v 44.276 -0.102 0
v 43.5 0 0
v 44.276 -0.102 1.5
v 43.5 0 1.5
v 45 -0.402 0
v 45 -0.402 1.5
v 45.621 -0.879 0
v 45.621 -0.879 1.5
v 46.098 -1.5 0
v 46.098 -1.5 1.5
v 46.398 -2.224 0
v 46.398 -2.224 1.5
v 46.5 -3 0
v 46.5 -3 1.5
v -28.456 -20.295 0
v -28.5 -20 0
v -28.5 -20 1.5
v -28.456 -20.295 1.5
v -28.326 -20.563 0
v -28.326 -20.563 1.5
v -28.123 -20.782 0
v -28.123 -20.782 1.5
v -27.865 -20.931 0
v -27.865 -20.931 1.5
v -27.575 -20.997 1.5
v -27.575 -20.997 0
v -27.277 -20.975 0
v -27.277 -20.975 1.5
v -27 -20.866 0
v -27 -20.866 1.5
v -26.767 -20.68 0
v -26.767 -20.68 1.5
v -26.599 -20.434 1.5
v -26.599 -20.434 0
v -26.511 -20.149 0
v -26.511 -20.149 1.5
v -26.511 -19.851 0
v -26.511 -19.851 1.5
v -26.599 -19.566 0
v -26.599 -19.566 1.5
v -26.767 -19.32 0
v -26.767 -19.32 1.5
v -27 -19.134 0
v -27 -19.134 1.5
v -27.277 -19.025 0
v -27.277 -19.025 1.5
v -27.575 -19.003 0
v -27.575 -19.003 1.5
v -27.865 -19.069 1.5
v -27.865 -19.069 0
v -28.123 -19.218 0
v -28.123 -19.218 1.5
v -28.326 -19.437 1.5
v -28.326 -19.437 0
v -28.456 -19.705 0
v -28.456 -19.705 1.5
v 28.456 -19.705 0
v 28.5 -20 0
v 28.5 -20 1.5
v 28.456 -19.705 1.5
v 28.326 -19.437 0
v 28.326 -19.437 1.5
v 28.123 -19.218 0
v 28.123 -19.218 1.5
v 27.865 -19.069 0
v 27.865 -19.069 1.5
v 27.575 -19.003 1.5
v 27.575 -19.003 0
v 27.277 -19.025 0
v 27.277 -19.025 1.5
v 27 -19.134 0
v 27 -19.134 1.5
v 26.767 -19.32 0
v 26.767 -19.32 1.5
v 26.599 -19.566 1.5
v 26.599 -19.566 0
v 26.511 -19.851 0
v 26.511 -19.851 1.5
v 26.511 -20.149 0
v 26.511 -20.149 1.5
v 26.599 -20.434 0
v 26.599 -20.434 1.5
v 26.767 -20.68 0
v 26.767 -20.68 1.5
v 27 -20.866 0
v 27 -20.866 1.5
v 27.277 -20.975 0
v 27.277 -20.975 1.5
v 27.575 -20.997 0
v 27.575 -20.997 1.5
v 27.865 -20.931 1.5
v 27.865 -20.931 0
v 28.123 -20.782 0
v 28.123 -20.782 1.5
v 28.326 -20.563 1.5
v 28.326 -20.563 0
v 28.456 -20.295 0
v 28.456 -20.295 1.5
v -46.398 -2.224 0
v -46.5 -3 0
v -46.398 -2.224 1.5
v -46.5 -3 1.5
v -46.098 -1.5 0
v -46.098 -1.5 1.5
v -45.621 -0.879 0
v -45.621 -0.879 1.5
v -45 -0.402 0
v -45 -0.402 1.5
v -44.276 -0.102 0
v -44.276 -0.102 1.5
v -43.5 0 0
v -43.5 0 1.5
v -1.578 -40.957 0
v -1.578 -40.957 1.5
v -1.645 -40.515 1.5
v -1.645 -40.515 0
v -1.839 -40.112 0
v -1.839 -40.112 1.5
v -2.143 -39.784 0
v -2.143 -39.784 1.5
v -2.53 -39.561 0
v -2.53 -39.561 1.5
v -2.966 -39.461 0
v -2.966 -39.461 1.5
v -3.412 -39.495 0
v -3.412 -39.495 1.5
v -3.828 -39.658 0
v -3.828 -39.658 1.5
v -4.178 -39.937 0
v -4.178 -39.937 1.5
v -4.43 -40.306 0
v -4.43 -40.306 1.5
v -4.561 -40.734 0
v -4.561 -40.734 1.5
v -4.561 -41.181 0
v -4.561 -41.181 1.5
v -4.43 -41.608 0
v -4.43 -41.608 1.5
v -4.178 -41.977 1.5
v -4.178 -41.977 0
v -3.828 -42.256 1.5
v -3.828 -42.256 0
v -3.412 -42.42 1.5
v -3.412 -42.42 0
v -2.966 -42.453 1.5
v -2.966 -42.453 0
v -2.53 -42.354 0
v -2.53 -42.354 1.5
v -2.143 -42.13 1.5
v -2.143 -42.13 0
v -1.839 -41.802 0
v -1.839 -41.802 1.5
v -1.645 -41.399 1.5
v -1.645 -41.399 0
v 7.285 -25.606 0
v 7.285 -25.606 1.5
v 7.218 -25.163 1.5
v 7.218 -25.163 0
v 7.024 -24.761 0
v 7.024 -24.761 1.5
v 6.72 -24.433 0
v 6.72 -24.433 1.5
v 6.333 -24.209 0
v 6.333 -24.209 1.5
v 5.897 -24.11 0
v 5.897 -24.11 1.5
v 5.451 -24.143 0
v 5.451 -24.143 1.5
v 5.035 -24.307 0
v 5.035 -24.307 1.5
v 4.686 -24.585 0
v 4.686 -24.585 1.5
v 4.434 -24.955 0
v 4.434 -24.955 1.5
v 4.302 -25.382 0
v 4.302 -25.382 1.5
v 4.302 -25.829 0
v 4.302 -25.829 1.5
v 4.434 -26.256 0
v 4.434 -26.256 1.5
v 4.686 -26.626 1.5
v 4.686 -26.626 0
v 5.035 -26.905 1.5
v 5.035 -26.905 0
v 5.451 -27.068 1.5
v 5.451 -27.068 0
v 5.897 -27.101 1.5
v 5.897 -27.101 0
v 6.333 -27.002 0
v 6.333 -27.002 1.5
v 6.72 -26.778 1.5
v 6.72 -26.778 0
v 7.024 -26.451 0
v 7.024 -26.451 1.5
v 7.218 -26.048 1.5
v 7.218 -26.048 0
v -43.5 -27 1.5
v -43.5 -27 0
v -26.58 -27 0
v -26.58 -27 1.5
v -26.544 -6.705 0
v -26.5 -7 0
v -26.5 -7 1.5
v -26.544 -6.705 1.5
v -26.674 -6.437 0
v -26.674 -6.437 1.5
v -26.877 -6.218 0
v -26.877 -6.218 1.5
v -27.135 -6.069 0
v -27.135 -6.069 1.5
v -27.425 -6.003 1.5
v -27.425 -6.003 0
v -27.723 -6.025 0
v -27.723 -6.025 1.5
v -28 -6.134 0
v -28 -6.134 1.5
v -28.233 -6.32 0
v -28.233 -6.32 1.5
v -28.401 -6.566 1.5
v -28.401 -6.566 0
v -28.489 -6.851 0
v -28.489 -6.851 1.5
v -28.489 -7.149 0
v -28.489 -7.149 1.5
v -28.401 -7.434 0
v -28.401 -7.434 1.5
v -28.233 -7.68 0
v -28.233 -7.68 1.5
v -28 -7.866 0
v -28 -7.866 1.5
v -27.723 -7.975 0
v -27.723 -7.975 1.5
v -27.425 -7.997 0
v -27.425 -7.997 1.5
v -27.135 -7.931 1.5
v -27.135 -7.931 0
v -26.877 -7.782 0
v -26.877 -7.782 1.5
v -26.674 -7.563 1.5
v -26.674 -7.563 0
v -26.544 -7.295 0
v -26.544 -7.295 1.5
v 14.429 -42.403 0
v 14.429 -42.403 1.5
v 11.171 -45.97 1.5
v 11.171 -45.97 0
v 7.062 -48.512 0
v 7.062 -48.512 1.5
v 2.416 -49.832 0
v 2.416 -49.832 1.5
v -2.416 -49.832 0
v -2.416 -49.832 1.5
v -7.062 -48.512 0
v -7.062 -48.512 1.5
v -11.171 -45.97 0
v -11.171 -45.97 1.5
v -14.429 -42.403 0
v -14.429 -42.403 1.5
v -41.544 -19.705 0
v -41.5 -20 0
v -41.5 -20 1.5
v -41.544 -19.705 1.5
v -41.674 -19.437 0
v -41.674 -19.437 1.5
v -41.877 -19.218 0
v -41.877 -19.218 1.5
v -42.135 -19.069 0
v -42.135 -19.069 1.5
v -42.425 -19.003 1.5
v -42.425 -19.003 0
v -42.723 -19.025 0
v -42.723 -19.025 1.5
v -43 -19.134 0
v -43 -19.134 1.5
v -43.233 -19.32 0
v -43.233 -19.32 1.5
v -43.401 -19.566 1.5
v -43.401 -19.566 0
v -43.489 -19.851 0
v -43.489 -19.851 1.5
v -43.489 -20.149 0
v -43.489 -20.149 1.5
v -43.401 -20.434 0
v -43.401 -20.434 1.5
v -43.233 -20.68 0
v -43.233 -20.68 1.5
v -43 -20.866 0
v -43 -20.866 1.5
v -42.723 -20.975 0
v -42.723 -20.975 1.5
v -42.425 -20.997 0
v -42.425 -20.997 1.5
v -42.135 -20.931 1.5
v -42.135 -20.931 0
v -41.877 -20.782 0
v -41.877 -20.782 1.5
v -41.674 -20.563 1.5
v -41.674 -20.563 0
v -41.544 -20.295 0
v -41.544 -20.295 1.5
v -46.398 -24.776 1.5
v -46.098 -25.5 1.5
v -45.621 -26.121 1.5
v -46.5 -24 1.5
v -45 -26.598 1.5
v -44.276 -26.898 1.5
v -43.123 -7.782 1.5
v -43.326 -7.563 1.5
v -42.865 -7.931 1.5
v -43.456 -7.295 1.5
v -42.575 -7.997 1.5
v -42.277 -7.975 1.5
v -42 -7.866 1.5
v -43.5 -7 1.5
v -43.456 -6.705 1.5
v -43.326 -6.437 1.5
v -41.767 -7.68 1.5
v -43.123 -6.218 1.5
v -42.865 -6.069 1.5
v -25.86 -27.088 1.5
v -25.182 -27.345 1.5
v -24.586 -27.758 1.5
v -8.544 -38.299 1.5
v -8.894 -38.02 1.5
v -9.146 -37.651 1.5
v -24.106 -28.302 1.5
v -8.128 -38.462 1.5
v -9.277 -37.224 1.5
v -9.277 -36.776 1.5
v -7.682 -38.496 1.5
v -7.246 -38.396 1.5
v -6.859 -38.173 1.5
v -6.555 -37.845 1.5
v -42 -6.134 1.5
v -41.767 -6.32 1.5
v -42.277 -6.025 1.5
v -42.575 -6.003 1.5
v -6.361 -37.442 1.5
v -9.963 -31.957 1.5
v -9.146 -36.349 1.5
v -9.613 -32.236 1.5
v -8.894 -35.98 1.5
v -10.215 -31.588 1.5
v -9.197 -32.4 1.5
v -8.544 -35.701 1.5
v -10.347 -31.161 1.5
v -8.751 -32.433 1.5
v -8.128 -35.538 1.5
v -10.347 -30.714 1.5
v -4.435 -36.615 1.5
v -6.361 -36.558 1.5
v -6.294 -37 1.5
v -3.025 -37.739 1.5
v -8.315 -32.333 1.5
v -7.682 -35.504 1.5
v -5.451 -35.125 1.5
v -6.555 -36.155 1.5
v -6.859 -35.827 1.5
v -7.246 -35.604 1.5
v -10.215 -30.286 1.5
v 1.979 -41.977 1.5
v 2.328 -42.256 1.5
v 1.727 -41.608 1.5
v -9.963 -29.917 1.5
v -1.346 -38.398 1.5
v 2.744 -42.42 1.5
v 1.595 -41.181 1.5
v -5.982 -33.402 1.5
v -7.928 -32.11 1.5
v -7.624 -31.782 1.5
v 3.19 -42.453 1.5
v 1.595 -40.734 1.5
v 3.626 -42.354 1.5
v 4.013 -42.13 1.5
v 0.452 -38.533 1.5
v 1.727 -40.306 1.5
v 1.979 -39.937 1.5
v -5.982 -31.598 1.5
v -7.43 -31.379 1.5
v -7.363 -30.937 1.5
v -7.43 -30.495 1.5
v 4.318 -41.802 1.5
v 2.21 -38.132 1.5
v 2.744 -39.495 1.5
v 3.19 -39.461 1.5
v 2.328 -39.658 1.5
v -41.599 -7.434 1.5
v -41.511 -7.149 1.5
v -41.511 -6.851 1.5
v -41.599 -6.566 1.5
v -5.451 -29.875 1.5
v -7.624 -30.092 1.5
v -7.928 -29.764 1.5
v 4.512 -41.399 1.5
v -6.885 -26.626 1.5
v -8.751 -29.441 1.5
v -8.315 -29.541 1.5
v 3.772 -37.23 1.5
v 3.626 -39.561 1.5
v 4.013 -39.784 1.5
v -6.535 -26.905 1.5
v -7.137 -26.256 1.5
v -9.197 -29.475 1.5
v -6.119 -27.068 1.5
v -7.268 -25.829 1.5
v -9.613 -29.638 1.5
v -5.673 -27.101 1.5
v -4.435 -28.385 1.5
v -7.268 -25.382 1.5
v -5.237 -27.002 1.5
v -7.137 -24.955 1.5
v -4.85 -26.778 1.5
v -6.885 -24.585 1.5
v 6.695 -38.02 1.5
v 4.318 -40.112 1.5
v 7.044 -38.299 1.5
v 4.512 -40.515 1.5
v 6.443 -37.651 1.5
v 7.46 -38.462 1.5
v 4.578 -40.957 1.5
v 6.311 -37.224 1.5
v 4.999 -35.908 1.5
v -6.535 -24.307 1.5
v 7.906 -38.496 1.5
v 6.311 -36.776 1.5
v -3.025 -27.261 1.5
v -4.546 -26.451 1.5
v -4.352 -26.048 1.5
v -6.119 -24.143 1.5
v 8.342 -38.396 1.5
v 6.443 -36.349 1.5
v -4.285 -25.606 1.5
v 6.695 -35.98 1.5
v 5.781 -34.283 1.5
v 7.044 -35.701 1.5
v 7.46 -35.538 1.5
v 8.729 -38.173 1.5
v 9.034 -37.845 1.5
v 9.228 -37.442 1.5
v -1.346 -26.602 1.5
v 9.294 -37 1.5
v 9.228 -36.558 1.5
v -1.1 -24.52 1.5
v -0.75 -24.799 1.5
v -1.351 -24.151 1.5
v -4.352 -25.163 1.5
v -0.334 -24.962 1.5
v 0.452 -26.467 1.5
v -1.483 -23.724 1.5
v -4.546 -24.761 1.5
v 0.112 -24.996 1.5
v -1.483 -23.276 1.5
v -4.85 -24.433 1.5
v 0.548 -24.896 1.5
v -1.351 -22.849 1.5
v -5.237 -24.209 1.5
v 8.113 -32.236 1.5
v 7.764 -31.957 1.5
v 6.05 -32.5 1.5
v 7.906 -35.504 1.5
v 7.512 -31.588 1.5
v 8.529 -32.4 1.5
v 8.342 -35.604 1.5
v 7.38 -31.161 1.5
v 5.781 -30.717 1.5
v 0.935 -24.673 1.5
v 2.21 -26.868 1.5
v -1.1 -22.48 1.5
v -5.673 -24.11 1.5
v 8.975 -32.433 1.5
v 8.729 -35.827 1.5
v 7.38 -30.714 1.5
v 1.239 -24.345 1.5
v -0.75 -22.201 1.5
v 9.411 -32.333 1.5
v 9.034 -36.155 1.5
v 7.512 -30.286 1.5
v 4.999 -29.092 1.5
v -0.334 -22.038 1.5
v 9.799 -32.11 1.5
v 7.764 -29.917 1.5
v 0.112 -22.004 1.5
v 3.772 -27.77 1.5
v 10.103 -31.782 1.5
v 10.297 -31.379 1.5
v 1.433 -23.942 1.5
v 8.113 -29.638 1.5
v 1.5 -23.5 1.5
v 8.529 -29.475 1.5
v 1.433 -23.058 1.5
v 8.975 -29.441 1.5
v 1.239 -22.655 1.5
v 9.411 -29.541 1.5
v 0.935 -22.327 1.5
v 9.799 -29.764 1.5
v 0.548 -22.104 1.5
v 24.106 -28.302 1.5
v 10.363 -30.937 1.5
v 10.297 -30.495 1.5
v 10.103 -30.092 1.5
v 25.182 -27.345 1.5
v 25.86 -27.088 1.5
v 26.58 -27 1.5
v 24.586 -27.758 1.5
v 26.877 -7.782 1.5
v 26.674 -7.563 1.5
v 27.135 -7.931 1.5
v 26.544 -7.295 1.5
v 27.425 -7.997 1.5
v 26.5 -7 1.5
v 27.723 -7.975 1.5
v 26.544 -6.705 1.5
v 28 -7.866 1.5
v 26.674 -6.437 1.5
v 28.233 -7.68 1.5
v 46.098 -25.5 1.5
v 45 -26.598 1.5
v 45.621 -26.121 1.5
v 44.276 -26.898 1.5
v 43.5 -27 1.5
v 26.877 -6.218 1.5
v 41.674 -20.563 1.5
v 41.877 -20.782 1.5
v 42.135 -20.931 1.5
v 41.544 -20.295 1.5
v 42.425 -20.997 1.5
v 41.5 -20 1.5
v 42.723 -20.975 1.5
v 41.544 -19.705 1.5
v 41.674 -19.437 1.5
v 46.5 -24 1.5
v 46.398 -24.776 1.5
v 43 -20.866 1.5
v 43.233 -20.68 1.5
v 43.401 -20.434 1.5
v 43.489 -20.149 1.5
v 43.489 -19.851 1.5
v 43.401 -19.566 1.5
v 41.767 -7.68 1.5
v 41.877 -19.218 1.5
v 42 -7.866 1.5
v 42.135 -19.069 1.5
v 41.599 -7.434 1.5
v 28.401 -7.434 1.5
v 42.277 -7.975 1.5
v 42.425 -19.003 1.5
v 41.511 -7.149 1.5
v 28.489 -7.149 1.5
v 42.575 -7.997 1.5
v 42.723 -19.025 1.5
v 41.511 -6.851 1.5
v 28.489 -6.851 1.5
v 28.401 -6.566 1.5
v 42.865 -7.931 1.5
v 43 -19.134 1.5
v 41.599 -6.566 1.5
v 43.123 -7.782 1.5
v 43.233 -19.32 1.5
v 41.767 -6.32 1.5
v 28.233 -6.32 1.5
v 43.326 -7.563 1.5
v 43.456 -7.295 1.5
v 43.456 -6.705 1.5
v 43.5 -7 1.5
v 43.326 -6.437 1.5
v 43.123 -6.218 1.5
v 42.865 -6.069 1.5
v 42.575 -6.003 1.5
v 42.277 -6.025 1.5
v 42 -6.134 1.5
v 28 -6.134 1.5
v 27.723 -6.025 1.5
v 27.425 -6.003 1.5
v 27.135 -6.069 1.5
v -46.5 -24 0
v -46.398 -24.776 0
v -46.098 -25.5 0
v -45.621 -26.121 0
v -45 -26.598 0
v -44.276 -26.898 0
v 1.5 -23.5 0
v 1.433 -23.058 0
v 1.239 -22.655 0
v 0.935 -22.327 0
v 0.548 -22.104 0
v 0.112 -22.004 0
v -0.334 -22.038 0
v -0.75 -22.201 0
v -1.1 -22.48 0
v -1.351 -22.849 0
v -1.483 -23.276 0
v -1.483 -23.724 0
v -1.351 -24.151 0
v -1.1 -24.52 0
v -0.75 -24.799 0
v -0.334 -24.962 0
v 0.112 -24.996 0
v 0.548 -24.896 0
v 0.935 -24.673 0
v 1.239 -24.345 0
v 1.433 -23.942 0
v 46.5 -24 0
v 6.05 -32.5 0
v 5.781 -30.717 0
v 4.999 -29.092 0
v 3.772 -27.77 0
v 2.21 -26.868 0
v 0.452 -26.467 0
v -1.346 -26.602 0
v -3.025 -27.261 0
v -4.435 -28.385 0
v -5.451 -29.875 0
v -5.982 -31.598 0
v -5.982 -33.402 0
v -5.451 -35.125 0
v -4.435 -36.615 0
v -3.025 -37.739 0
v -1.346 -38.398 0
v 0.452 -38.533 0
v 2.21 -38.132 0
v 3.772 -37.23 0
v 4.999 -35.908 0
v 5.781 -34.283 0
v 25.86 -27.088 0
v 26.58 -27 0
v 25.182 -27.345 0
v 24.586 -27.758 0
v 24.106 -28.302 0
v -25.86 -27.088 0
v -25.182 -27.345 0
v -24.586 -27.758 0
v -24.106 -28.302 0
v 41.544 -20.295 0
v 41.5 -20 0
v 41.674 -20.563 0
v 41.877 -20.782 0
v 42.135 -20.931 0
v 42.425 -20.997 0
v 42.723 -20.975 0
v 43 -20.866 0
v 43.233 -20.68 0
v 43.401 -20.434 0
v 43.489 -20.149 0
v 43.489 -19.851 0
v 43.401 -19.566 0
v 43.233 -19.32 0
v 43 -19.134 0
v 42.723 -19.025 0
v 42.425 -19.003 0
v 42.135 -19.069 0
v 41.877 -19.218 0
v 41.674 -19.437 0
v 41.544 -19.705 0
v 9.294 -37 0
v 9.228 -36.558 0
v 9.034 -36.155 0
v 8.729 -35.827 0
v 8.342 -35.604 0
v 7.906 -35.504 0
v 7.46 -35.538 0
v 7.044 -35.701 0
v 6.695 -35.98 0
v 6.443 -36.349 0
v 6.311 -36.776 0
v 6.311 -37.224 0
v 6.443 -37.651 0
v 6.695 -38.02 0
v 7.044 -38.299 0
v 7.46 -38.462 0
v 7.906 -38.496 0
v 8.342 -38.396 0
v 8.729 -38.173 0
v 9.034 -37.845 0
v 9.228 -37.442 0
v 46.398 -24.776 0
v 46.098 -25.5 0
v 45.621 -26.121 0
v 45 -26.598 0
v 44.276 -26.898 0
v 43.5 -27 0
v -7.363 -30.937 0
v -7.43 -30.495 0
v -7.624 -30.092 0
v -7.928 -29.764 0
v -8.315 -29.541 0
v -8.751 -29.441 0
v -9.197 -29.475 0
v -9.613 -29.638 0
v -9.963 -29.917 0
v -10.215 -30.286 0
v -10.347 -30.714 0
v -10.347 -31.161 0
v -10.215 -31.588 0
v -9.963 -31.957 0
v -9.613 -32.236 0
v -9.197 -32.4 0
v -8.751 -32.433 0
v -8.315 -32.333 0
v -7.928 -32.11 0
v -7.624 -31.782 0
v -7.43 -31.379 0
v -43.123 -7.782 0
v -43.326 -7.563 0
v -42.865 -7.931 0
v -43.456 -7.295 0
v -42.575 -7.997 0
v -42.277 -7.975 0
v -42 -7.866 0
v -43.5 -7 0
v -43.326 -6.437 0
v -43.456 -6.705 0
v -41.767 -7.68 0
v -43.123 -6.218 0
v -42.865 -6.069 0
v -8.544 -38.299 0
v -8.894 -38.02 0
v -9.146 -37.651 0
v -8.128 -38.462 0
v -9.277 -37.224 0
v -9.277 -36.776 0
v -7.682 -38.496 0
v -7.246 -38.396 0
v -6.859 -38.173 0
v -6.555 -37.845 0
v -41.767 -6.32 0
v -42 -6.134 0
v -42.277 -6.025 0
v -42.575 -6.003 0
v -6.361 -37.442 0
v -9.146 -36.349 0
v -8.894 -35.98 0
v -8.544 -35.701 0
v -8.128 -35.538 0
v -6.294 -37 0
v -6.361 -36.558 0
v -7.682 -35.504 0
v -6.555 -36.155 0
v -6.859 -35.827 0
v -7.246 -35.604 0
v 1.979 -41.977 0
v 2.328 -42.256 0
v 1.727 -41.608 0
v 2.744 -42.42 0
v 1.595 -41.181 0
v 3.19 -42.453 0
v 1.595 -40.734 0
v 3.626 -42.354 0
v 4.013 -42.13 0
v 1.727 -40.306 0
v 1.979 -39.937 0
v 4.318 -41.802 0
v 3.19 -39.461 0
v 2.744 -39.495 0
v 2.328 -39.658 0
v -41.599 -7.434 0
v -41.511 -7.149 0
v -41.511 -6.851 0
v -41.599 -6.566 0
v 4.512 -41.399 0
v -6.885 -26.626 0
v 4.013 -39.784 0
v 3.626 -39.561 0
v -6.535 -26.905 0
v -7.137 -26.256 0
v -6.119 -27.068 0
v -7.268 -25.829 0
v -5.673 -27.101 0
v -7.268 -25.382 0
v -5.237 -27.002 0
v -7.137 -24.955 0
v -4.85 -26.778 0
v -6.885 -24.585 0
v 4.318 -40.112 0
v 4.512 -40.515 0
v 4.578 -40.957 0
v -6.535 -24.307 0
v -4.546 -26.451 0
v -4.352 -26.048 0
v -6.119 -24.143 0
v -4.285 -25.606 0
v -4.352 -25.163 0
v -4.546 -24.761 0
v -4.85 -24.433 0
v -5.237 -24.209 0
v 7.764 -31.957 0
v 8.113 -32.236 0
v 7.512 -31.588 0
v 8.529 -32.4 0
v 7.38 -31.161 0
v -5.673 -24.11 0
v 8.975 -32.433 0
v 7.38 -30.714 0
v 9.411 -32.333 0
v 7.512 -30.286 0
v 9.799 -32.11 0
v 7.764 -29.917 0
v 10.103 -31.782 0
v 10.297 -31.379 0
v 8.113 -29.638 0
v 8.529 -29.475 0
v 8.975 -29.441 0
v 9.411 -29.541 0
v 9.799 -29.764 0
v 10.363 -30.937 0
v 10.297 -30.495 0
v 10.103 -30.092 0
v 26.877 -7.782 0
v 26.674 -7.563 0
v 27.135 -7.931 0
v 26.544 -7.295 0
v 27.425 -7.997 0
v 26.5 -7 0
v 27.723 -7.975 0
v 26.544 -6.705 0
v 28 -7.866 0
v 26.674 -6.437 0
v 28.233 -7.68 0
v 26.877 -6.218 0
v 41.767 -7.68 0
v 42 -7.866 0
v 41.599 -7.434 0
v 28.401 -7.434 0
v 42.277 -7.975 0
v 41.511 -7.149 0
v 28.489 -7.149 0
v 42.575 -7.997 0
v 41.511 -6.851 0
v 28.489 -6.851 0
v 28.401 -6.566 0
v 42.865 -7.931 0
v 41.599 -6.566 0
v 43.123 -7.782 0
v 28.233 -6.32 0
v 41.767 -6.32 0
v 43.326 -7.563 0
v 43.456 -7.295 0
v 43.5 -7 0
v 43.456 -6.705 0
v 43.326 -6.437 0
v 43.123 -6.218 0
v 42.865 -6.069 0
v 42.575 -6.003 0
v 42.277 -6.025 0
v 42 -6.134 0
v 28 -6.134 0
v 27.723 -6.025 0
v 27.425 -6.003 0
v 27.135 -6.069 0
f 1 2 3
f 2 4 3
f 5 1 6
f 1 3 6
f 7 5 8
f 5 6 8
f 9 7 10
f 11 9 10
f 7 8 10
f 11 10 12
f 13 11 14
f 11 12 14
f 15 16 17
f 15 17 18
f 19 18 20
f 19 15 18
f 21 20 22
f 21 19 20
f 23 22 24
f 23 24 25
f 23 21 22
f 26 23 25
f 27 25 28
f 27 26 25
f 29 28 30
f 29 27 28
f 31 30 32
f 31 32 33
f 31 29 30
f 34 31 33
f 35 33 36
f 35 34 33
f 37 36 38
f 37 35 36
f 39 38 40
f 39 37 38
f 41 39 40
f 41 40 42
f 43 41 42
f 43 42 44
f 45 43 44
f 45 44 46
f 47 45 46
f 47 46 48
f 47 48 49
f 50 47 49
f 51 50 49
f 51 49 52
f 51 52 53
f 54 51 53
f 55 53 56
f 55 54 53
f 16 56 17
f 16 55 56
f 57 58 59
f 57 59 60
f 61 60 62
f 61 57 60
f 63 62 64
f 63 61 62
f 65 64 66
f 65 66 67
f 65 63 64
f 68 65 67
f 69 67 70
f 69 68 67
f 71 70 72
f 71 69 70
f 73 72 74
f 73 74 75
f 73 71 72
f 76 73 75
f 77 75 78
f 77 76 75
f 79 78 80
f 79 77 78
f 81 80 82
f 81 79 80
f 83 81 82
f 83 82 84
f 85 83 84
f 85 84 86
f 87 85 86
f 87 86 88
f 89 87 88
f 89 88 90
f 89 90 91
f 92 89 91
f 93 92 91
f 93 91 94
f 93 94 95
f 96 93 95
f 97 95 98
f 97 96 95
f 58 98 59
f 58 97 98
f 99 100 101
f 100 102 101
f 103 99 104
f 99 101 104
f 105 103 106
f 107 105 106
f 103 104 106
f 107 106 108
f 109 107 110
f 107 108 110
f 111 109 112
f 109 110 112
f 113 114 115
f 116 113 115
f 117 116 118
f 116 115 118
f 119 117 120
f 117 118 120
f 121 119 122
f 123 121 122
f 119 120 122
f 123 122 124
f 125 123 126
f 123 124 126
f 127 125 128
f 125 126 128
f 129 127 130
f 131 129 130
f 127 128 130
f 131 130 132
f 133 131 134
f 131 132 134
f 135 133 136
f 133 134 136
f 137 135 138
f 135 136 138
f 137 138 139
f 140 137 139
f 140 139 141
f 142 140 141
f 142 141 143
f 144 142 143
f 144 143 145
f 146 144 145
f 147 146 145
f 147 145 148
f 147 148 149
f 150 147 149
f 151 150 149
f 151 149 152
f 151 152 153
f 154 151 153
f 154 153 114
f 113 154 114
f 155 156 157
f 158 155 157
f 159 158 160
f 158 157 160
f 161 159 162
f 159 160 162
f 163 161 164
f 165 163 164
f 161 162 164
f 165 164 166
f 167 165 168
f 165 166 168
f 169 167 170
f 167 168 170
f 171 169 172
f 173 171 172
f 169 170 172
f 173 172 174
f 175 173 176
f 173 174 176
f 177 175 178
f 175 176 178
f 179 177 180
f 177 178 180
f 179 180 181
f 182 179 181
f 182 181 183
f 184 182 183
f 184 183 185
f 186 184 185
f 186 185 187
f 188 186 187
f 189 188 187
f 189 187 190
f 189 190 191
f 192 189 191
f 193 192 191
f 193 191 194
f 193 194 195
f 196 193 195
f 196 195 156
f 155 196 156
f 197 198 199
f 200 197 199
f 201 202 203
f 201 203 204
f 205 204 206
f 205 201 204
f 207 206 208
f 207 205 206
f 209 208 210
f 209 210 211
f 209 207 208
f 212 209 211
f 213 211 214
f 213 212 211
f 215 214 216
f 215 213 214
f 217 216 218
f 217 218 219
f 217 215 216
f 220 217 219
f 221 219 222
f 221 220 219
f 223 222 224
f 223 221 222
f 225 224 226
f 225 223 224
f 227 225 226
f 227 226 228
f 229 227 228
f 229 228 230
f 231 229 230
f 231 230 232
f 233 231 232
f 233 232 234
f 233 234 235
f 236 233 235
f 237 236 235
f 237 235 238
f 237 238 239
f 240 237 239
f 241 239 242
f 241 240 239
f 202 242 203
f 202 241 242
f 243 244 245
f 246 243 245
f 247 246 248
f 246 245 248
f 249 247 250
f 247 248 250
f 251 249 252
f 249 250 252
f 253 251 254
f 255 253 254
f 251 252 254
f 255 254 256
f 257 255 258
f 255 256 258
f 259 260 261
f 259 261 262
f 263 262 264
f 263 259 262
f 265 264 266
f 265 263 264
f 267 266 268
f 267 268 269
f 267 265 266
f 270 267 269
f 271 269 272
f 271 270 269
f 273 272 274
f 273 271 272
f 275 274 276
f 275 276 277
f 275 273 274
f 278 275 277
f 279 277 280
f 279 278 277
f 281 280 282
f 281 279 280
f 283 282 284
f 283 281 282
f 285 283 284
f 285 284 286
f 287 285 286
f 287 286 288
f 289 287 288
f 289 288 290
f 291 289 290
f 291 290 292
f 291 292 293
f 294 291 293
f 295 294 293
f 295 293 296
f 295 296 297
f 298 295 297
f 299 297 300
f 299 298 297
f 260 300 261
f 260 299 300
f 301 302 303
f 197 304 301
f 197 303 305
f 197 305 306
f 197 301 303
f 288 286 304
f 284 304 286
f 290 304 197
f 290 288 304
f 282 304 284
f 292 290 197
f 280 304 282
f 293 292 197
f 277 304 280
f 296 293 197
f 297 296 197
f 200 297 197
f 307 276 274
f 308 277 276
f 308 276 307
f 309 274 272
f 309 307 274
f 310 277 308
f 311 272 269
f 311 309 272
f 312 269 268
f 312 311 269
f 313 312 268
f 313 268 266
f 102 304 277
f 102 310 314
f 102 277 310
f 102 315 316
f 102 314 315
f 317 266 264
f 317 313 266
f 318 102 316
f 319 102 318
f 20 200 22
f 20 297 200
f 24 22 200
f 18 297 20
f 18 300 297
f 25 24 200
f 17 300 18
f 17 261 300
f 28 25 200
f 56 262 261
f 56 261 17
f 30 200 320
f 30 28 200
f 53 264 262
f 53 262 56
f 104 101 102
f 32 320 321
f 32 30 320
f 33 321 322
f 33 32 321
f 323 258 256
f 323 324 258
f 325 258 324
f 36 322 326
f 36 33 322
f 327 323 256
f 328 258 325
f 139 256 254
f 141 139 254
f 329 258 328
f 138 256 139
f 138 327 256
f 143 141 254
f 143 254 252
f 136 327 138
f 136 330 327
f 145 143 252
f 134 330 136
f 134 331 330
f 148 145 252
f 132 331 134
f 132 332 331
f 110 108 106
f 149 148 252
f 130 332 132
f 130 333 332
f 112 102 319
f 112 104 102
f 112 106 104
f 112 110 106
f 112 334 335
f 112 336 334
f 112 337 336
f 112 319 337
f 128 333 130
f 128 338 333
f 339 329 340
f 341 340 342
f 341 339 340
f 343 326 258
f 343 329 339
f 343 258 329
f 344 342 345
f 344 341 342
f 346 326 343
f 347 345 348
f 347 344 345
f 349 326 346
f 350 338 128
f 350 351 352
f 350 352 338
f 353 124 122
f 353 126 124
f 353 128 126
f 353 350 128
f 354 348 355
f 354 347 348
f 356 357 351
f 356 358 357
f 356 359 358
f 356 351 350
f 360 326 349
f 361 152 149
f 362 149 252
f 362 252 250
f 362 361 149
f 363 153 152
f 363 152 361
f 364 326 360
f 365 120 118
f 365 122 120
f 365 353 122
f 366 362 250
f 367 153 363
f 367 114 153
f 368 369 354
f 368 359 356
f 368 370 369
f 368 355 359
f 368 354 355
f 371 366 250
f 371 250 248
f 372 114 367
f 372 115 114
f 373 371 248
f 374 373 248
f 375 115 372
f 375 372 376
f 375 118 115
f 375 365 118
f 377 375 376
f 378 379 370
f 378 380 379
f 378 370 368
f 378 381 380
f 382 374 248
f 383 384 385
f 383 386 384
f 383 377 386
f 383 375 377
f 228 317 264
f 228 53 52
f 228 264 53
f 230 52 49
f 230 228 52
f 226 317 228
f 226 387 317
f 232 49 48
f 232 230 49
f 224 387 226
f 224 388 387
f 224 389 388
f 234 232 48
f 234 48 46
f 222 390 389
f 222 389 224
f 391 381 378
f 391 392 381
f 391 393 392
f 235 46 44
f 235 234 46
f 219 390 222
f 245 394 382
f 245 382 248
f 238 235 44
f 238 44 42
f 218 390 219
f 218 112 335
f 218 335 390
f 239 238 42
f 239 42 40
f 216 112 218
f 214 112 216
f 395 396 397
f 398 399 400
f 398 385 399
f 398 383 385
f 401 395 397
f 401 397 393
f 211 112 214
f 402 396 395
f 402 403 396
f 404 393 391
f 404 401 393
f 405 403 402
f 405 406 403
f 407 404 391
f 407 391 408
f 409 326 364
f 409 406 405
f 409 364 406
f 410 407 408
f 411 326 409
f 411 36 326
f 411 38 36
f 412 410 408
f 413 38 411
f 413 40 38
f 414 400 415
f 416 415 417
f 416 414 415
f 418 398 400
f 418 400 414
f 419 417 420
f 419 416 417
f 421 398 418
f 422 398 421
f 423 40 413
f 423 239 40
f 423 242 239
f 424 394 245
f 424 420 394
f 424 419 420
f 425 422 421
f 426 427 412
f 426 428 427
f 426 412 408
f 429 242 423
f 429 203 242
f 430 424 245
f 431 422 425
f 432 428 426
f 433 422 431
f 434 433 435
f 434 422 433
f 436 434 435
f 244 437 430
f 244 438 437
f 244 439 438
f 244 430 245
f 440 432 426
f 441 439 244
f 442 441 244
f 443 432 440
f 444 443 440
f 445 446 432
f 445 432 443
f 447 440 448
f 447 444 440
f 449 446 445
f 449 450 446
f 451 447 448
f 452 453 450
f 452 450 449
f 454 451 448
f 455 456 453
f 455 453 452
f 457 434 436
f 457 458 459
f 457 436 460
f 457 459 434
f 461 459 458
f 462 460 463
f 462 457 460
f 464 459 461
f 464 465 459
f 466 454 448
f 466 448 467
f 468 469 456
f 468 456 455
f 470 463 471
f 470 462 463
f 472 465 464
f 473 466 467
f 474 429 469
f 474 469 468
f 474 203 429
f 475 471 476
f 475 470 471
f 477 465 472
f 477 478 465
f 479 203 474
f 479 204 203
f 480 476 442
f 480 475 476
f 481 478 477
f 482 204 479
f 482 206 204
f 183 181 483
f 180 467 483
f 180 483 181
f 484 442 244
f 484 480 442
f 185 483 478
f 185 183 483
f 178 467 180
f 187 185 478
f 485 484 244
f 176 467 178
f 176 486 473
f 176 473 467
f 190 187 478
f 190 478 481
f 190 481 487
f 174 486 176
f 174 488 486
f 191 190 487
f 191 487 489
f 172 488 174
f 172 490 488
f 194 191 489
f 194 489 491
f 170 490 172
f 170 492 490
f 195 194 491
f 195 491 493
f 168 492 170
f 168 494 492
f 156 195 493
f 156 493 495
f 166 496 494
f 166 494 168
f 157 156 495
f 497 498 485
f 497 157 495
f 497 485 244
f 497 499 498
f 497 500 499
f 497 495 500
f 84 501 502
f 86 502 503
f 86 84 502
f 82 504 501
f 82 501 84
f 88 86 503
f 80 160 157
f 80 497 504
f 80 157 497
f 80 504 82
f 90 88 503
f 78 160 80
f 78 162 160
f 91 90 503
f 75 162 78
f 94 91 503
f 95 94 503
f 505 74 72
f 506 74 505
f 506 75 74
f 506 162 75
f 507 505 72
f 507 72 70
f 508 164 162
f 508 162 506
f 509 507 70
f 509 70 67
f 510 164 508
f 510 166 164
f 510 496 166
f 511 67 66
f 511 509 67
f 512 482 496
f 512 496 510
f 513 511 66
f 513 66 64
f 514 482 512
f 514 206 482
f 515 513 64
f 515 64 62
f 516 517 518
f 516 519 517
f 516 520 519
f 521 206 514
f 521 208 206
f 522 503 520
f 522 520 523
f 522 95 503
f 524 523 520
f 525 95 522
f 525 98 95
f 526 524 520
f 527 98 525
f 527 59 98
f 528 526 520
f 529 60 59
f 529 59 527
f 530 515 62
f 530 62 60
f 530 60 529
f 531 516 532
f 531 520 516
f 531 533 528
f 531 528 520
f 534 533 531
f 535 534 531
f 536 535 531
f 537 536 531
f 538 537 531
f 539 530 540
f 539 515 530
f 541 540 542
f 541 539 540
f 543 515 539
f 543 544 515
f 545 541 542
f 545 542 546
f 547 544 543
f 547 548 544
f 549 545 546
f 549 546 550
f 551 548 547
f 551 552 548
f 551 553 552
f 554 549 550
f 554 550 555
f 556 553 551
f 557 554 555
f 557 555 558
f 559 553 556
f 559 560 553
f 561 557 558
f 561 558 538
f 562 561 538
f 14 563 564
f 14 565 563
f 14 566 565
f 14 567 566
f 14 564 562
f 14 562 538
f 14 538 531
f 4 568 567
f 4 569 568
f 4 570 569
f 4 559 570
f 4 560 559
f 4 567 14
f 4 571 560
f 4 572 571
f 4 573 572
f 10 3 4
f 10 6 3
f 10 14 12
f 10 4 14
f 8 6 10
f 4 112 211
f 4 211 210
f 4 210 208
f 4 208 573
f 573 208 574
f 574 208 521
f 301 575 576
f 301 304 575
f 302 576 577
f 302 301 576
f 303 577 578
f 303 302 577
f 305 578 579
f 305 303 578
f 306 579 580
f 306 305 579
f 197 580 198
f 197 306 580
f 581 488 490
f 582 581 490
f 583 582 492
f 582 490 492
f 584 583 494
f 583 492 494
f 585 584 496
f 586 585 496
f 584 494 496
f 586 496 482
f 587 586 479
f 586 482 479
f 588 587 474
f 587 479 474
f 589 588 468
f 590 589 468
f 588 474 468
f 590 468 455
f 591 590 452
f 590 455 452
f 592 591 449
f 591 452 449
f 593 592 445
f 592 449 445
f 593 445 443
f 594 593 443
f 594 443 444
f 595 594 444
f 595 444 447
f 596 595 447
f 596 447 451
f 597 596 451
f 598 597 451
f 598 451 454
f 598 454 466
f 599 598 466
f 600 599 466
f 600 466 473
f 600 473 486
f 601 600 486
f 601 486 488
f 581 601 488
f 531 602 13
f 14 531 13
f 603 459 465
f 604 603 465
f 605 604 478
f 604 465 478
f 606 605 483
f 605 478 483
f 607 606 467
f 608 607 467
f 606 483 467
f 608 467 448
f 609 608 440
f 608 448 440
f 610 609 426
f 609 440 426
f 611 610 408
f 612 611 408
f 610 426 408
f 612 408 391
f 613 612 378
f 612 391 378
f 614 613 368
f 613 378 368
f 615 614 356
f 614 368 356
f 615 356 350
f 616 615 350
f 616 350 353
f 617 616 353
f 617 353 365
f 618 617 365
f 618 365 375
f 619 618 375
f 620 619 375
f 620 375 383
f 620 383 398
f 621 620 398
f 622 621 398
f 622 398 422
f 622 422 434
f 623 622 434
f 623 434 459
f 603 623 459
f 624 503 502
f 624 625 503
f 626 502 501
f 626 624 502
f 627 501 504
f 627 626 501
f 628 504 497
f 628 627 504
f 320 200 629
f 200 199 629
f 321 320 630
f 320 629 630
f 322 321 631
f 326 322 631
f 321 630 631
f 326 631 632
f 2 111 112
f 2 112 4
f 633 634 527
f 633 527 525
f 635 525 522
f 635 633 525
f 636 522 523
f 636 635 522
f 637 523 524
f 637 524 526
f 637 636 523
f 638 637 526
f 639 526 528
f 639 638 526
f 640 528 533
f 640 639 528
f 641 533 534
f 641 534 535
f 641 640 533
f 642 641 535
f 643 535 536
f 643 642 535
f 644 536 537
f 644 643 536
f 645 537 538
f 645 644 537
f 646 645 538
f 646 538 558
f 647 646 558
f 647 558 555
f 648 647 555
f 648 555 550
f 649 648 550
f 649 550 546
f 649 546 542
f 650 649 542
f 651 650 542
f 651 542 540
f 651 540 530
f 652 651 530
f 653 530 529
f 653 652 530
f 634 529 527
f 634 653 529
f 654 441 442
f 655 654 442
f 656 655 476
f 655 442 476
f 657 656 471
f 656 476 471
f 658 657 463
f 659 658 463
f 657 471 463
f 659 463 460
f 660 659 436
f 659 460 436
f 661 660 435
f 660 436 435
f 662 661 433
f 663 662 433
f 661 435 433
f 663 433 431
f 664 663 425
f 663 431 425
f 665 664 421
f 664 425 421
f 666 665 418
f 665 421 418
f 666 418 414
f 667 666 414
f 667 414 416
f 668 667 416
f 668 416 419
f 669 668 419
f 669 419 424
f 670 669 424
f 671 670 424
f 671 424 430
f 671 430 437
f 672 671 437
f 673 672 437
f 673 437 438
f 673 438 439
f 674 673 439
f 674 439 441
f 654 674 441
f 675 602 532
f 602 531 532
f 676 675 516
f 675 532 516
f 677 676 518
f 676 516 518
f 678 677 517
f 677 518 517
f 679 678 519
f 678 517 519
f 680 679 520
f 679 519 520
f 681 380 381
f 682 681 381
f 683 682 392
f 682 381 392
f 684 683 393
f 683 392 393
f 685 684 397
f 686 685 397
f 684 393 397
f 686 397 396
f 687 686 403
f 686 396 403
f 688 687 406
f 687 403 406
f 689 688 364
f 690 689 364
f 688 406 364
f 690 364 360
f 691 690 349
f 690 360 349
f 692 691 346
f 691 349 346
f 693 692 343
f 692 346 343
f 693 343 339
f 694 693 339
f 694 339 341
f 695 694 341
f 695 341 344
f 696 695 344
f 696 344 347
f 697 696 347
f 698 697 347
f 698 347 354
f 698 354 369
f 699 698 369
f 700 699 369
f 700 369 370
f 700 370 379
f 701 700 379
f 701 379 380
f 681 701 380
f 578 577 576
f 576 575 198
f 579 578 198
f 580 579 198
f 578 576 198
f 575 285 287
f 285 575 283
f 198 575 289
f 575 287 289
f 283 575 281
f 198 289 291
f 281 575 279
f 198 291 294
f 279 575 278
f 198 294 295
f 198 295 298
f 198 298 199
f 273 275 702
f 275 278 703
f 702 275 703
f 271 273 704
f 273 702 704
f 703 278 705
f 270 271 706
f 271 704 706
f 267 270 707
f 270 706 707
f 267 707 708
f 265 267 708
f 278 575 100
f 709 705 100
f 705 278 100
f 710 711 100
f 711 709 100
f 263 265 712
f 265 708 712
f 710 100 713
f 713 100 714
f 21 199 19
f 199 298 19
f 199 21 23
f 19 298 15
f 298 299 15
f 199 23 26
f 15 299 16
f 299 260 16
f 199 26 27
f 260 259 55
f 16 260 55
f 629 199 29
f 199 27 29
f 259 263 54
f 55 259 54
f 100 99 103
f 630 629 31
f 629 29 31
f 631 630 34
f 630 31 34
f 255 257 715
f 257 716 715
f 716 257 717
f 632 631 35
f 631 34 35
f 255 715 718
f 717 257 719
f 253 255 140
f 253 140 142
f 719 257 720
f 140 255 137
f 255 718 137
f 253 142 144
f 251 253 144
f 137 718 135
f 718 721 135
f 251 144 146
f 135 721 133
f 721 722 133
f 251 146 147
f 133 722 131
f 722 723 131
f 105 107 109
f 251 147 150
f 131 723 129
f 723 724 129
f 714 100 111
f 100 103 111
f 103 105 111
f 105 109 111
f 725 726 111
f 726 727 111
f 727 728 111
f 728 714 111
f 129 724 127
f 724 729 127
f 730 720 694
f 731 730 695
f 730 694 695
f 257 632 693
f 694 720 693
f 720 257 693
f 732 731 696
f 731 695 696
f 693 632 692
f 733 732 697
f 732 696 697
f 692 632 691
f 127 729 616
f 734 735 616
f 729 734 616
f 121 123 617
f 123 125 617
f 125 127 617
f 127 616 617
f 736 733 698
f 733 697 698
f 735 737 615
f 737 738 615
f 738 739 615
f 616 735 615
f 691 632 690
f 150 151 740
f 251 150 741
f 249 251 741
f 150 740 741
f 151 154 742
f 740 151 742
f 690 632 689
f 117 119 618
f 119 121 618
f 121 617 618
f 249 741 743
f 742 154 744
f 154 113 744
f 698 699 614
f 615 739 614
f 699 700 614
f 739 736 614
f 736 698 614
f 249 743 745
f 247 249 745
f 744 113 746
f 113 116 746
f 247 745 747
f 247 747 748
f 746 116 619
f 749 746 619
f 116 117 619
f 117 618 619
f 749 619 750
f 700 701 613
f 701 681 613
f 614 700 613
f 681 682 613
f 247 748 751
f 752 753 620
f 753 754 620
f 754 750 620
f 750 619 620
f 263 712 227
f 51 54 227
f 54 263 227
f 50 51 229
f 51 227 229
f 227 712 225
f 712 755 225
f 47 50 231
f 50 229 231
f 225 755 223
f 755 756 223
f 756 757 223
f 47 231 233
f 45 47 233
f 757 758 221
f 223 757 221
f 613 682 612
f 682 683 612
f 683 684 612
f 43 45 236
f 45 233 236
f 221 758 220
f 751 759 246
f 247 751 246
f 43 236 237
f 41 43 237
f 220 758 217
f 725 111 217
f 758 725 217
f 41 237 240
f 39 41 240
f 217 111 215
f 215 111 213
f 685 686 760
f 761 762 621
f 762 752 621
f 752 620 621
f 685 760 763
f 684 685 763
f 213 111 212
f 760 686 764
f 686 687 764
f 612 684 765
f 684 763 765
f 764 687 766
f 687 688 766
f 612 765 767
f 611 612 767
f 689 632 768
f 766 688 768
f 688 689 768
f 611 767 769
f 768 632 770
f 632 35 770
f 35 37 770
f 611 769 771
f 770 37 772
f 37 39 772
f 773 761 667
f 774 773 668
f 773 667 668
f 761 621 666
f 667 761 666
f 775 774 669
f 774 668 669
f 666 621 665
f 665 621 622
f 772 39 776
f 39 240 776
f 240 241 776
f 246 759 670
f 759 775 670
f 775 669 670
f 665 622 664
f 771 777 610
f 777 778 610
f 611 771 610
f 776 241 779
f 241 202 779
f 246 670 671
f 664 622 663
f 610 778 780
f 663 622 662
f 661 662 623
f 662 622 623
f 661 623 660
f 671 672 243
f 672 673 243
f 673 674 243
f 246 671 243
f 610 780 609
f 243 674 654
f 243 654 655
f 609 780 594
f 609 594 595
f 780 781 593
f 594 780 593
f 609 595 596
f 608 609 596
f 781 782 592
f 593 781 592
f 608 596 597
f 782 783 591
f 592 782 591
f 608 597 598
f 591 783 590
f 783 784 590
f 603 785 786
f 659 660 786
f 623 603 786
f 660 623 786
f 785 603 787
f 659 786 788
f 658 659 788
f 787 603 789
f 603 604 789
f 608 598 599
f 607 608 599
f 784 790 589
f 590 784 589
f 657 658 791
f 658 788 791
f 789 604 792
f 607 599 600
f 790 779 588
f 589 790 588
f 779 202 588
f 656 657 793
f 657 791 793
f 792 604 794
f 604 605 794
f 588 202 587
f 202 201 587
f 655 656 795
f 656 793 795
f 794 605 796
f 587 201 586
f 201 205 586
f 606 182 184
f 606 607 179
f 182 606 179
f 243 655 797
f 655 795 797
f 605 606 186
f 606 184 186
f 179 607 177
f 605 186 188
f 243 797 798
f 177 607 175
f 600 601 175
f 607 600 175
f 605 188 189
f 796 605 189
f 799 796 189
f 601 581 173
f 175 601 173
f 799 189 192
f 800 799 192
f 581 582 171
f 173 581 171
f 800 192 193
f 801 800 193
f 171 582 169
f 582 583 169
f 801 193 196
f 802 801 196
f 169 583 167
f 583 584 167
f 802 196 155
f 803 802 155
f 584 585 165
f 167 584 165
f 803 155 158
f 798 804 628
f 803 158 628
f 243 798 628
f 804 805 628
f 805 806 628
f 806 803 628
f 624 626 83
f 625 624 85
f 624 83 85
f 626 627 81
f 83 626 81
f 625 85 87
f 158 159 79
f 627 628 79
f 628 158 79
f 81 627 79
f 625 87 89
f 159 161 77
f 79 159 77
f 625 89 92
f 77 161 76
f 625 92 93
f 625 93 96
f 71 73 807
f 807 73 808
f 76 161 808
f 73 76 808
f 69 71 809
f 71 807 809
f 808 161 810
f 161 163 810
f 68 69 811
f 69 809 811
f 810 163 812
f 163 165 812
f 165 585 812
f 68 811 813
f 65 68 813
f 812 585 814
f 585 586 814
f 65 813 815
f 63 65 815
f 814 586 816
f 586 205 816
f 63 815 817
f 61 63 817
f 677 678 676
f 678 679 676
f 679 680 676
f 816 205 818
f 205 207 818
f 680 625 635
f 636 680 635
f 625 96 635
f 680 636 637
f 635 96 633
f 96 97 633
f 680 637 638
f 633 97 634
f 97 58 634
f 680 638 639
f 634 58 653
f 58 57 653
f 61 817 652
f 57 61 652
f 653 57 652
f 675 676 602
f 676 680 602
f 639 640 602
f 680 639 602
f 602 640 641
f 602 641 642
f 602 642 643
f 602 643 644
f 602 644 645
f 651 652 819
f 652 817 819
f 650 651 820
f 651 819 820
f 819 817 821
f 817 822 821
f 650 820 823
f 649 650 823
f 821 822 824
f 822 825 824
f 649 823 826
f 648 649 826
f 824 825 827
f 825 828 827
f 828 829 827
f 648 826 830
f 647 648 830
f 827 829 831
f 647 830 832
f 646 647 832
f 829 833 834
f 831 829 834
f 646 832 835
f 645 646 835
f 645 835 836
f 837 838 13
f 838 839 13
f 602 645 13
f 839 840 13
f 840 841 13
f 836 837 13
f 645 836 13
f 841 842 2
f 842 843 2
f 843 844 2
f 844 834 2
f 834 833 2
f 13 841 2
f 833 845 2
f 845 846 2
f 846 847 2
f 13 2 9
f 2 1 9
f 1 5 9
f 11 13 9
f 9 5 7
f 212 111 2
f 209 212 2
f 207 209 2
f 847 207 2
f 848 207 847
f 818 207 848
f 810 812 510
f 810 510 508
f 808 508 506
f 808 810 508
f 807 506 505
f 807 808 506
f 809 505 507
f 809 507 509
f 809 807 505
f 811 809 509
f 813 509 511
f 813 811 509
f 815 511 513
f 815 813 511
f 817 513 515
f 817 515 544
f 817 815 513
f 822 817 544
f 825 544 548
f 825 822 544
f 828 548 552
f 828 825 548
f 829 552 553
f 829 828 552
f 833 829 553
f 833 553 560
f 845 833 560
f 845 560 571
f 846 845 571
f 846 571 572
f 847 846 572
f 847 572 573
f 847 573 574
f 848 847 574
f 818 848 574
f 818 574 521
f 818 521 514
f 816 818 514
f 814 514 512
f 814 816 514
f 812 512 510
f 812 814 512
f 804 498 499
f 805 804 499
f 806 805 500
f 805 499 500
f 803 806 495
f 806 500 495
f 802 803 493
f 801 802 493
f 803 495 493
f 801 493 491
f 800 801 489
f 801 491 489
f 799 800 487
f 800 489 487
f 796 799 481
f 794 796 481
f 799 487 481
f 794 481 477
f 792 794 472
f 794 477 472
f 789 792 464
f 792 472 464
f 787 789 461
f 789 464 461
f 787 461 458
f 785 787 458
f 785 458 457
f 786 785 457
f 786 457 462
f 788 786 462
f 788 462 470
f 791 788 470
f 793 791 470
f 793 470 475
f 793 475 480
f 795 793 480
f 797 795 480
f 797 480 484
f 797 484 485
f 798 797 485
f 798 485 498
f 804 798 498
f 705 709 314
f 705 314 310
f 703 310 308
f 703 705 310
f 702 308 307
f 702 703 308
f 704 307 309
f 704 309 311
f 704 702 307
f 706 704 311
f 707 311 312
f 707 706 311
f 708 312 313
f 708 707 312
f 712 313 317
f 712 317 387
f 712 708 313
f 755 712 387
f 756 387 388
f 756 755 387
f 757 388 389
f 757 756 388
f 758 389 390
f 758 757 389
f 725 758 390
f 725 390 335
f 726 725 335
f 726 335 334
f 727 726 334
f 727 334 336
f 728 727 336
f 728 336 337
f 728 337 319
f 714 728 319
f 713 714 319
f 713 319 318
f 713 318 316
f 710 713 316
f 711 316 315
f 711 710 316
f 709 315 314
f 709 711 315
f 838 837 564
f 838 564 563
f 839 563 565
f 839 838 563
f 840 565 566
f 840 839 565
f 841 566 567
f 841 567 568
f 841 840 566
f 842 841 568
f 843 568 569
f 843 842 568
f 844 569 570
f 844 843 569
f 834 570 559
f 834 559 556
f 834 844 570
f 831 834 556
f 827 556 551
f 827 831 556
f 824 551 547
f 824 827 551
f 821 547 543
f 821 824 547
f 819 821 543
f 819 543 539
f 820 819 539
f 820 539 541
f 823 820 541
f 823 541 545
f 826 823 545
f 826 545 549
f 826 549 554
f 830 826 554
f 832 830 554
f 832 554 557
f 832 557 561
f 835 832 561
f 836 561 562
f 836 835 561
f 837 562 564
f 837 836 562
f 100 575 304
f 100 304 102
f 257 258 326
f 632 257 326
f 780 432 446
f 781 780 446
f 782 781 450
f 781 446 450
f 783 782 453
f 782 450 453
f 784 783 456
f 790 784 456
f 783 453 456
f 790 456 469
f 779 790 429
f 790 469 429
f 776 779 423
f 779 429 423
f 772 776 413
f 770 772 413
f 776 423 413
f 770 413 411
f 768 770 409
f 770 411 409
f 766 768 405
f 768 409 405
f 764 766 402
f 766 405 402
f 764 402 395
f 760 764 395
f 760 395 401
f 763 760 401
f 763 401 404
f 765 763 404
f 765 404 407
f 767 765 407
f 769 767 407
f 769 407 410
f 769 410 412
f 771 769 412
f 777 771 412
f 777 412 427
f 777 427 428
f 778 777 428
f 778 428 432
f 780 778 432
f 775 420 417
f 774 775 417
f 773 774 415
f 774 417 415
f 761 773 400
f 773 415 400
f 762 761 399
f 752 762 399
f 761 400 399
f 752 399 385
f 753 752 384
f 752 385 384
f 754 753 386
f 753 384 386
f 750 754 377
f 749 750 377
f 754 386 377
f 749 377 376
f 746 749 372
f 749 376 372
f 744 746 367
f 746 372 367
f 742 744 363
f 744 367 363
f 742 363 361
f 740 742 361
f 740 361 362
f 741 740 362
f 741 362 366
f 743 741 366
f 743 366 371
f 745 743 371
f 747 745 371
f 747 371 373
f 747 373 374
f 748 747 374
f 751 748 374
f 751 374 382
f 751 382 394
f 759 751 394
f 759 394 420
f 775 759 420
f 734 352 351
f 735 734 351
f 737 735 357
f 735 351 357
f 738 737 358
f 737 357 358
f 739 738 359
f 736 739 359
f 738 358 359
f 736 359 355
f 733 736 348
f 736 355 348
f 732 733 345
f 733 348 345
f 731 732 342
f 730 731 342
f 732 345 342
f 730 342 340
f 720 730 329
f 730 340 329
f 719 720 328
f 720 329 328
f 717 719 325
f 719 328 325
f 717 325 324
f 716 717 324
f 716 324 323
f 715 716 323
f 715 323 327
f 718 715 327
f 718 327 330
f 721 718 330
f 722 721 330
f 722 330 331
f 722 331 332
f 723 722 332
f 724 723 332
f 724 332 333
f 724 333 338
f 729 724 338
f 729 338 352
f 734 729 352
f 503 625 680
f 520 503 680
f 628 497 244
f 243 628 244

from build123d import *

# Parameters (mm, degrees)
ESQUISSE1_W             = 93
ESQUISSE1_H             = 27
ESQUISSE1_R             = 1
BOSS_EXTRU_1_DEPTH      = 1.5
BOSS_EXTRU_2_DEPTH      = 1.5
ESQUISSE3_R             = 6.05
ESQUISSE3_R_2           = 1.5
ENL_V_MAT_EXTRU_1_DEPTH = 69.297144889
CONG_2_R                = 3


with BuildPart() as part:
    # Esquisse1 → Boss.-Extru.1 (new body)
    with BuildSketch(Plane.XY):
        with Locations((0, -13.5)):
            Rectangle(ESQUISSE1_W, ESQUISSE1_H)
        with Locations((42.5, -7)):
            Circle(ESQUISSE1_R, mode=Mode.SUBTRACT)
        with Locations(Location((27.5, -7, 0), (0, 0, 180))):
            Circle(ESQUISSE1_R, mode=Mode.SUBTRACT)
        with Locations(Location((42.5, -20, 0), (0, 0, 180))):
            Circle(ESQUISSE1_R, mode=Mode.SUBTRACT)
        with Locations((27.5, -20)):
            Circle(ESQUISSE1_R, mode=Mode.SUBTRACT)
        with Locations(Location((-42.5, -7, 0), (0, 0, 180))):
            Circle(ESQUISSE1_R, mode=Mode.SUBTRACT)
        with Locations((-42.5, -20)):
            Circle(ESQUISSE1_R, mode=Mode.SUBTRACT)
        with Locations(Location((-27.5, -20, 0), (0, 0, 180))):
            Circle(ESQUISSE1_R, mode=Mode.SUBTRACT)
        with Locations((-27.5, -7)):
            Circle(ESQUISSE1_R, mode=Mode.SUBTRACT)
    extrude(amount=BOSS_EXTRU_1_DEPTH)

    # Esquisse2 → Boss.-Extru.2 (add)
    with BuildSketch(Plane.XY.offset(1.5)):
        with BuildLine():
            Line((-14.428612572, -42.402784419), (-25, -27))
            Line((-25, -27), (25, -27))
            Line((25, -27), (14.428612572, -42.402784419))
            ThreePointArc((14.428612572, -42.402784419), (0, -50), (-14.428612572, -42.402784419))
        make_face()
    extrude(amount=-BOSS_EXTRU_2_DEPTH)

    # Esquisse3 → Enlèv. mat.-Extru.1 (cut, through all)
    with BuildSketch(Plane.XY.offset(1.5)):
        with Locations((0, -32.5)):
            Circle(ESQUISSE3_R)
        with Locations((0, -23.5)):
            Circle(ESQUISSE3_R_2)
        with Locations((5.785088487, -25.605600012)):
            Circle(ESQUISSE3_R_2)
        with Locations((8.863269777, -30.937166401)):
            Circle(ESQUISSE3_R_2)
        with Locations((7.794228634, -37)):
            Circle(ESQUISSE3_R_2)
        with Locations((3.07818129, -40.957233587)):
            Circle(ESQUISSE3_R_2)
        with Locations((-3.07818129, -40.957233587)):
            Circle(ESQUISSE3_R_2)
        with Locations((-7.794228634, -37)):
            Circle(ESQUISSE3_R_2)
        with Locations((-8.863269777, -30.937166401)):
            Circle(ESQUISSE3_R_2)
        with Locations((-5.785088487, -25.605600012)):
            Circle(ESQUISSE3_R_2)
    extrude(amount=-ENL_V_MAT_EXTRU_1_DEPTH, mode=Mode.SUBTRACT)

    # Congé2
    cong_2_edges = [part.edges().sort_by_distance(p)[0] for p in [
        (46.5, 0, 0.75),
        (46.5, -27, 0.75),
        (-46.5, -27, 0.75),
        (-46.5, 0, 0.75),
        (25, -27, 0.75),
        (-25, -27, 0.75),
    ]]
    fillet(cong_2_edges, radius=CONG_2_R)


solid = part.part
